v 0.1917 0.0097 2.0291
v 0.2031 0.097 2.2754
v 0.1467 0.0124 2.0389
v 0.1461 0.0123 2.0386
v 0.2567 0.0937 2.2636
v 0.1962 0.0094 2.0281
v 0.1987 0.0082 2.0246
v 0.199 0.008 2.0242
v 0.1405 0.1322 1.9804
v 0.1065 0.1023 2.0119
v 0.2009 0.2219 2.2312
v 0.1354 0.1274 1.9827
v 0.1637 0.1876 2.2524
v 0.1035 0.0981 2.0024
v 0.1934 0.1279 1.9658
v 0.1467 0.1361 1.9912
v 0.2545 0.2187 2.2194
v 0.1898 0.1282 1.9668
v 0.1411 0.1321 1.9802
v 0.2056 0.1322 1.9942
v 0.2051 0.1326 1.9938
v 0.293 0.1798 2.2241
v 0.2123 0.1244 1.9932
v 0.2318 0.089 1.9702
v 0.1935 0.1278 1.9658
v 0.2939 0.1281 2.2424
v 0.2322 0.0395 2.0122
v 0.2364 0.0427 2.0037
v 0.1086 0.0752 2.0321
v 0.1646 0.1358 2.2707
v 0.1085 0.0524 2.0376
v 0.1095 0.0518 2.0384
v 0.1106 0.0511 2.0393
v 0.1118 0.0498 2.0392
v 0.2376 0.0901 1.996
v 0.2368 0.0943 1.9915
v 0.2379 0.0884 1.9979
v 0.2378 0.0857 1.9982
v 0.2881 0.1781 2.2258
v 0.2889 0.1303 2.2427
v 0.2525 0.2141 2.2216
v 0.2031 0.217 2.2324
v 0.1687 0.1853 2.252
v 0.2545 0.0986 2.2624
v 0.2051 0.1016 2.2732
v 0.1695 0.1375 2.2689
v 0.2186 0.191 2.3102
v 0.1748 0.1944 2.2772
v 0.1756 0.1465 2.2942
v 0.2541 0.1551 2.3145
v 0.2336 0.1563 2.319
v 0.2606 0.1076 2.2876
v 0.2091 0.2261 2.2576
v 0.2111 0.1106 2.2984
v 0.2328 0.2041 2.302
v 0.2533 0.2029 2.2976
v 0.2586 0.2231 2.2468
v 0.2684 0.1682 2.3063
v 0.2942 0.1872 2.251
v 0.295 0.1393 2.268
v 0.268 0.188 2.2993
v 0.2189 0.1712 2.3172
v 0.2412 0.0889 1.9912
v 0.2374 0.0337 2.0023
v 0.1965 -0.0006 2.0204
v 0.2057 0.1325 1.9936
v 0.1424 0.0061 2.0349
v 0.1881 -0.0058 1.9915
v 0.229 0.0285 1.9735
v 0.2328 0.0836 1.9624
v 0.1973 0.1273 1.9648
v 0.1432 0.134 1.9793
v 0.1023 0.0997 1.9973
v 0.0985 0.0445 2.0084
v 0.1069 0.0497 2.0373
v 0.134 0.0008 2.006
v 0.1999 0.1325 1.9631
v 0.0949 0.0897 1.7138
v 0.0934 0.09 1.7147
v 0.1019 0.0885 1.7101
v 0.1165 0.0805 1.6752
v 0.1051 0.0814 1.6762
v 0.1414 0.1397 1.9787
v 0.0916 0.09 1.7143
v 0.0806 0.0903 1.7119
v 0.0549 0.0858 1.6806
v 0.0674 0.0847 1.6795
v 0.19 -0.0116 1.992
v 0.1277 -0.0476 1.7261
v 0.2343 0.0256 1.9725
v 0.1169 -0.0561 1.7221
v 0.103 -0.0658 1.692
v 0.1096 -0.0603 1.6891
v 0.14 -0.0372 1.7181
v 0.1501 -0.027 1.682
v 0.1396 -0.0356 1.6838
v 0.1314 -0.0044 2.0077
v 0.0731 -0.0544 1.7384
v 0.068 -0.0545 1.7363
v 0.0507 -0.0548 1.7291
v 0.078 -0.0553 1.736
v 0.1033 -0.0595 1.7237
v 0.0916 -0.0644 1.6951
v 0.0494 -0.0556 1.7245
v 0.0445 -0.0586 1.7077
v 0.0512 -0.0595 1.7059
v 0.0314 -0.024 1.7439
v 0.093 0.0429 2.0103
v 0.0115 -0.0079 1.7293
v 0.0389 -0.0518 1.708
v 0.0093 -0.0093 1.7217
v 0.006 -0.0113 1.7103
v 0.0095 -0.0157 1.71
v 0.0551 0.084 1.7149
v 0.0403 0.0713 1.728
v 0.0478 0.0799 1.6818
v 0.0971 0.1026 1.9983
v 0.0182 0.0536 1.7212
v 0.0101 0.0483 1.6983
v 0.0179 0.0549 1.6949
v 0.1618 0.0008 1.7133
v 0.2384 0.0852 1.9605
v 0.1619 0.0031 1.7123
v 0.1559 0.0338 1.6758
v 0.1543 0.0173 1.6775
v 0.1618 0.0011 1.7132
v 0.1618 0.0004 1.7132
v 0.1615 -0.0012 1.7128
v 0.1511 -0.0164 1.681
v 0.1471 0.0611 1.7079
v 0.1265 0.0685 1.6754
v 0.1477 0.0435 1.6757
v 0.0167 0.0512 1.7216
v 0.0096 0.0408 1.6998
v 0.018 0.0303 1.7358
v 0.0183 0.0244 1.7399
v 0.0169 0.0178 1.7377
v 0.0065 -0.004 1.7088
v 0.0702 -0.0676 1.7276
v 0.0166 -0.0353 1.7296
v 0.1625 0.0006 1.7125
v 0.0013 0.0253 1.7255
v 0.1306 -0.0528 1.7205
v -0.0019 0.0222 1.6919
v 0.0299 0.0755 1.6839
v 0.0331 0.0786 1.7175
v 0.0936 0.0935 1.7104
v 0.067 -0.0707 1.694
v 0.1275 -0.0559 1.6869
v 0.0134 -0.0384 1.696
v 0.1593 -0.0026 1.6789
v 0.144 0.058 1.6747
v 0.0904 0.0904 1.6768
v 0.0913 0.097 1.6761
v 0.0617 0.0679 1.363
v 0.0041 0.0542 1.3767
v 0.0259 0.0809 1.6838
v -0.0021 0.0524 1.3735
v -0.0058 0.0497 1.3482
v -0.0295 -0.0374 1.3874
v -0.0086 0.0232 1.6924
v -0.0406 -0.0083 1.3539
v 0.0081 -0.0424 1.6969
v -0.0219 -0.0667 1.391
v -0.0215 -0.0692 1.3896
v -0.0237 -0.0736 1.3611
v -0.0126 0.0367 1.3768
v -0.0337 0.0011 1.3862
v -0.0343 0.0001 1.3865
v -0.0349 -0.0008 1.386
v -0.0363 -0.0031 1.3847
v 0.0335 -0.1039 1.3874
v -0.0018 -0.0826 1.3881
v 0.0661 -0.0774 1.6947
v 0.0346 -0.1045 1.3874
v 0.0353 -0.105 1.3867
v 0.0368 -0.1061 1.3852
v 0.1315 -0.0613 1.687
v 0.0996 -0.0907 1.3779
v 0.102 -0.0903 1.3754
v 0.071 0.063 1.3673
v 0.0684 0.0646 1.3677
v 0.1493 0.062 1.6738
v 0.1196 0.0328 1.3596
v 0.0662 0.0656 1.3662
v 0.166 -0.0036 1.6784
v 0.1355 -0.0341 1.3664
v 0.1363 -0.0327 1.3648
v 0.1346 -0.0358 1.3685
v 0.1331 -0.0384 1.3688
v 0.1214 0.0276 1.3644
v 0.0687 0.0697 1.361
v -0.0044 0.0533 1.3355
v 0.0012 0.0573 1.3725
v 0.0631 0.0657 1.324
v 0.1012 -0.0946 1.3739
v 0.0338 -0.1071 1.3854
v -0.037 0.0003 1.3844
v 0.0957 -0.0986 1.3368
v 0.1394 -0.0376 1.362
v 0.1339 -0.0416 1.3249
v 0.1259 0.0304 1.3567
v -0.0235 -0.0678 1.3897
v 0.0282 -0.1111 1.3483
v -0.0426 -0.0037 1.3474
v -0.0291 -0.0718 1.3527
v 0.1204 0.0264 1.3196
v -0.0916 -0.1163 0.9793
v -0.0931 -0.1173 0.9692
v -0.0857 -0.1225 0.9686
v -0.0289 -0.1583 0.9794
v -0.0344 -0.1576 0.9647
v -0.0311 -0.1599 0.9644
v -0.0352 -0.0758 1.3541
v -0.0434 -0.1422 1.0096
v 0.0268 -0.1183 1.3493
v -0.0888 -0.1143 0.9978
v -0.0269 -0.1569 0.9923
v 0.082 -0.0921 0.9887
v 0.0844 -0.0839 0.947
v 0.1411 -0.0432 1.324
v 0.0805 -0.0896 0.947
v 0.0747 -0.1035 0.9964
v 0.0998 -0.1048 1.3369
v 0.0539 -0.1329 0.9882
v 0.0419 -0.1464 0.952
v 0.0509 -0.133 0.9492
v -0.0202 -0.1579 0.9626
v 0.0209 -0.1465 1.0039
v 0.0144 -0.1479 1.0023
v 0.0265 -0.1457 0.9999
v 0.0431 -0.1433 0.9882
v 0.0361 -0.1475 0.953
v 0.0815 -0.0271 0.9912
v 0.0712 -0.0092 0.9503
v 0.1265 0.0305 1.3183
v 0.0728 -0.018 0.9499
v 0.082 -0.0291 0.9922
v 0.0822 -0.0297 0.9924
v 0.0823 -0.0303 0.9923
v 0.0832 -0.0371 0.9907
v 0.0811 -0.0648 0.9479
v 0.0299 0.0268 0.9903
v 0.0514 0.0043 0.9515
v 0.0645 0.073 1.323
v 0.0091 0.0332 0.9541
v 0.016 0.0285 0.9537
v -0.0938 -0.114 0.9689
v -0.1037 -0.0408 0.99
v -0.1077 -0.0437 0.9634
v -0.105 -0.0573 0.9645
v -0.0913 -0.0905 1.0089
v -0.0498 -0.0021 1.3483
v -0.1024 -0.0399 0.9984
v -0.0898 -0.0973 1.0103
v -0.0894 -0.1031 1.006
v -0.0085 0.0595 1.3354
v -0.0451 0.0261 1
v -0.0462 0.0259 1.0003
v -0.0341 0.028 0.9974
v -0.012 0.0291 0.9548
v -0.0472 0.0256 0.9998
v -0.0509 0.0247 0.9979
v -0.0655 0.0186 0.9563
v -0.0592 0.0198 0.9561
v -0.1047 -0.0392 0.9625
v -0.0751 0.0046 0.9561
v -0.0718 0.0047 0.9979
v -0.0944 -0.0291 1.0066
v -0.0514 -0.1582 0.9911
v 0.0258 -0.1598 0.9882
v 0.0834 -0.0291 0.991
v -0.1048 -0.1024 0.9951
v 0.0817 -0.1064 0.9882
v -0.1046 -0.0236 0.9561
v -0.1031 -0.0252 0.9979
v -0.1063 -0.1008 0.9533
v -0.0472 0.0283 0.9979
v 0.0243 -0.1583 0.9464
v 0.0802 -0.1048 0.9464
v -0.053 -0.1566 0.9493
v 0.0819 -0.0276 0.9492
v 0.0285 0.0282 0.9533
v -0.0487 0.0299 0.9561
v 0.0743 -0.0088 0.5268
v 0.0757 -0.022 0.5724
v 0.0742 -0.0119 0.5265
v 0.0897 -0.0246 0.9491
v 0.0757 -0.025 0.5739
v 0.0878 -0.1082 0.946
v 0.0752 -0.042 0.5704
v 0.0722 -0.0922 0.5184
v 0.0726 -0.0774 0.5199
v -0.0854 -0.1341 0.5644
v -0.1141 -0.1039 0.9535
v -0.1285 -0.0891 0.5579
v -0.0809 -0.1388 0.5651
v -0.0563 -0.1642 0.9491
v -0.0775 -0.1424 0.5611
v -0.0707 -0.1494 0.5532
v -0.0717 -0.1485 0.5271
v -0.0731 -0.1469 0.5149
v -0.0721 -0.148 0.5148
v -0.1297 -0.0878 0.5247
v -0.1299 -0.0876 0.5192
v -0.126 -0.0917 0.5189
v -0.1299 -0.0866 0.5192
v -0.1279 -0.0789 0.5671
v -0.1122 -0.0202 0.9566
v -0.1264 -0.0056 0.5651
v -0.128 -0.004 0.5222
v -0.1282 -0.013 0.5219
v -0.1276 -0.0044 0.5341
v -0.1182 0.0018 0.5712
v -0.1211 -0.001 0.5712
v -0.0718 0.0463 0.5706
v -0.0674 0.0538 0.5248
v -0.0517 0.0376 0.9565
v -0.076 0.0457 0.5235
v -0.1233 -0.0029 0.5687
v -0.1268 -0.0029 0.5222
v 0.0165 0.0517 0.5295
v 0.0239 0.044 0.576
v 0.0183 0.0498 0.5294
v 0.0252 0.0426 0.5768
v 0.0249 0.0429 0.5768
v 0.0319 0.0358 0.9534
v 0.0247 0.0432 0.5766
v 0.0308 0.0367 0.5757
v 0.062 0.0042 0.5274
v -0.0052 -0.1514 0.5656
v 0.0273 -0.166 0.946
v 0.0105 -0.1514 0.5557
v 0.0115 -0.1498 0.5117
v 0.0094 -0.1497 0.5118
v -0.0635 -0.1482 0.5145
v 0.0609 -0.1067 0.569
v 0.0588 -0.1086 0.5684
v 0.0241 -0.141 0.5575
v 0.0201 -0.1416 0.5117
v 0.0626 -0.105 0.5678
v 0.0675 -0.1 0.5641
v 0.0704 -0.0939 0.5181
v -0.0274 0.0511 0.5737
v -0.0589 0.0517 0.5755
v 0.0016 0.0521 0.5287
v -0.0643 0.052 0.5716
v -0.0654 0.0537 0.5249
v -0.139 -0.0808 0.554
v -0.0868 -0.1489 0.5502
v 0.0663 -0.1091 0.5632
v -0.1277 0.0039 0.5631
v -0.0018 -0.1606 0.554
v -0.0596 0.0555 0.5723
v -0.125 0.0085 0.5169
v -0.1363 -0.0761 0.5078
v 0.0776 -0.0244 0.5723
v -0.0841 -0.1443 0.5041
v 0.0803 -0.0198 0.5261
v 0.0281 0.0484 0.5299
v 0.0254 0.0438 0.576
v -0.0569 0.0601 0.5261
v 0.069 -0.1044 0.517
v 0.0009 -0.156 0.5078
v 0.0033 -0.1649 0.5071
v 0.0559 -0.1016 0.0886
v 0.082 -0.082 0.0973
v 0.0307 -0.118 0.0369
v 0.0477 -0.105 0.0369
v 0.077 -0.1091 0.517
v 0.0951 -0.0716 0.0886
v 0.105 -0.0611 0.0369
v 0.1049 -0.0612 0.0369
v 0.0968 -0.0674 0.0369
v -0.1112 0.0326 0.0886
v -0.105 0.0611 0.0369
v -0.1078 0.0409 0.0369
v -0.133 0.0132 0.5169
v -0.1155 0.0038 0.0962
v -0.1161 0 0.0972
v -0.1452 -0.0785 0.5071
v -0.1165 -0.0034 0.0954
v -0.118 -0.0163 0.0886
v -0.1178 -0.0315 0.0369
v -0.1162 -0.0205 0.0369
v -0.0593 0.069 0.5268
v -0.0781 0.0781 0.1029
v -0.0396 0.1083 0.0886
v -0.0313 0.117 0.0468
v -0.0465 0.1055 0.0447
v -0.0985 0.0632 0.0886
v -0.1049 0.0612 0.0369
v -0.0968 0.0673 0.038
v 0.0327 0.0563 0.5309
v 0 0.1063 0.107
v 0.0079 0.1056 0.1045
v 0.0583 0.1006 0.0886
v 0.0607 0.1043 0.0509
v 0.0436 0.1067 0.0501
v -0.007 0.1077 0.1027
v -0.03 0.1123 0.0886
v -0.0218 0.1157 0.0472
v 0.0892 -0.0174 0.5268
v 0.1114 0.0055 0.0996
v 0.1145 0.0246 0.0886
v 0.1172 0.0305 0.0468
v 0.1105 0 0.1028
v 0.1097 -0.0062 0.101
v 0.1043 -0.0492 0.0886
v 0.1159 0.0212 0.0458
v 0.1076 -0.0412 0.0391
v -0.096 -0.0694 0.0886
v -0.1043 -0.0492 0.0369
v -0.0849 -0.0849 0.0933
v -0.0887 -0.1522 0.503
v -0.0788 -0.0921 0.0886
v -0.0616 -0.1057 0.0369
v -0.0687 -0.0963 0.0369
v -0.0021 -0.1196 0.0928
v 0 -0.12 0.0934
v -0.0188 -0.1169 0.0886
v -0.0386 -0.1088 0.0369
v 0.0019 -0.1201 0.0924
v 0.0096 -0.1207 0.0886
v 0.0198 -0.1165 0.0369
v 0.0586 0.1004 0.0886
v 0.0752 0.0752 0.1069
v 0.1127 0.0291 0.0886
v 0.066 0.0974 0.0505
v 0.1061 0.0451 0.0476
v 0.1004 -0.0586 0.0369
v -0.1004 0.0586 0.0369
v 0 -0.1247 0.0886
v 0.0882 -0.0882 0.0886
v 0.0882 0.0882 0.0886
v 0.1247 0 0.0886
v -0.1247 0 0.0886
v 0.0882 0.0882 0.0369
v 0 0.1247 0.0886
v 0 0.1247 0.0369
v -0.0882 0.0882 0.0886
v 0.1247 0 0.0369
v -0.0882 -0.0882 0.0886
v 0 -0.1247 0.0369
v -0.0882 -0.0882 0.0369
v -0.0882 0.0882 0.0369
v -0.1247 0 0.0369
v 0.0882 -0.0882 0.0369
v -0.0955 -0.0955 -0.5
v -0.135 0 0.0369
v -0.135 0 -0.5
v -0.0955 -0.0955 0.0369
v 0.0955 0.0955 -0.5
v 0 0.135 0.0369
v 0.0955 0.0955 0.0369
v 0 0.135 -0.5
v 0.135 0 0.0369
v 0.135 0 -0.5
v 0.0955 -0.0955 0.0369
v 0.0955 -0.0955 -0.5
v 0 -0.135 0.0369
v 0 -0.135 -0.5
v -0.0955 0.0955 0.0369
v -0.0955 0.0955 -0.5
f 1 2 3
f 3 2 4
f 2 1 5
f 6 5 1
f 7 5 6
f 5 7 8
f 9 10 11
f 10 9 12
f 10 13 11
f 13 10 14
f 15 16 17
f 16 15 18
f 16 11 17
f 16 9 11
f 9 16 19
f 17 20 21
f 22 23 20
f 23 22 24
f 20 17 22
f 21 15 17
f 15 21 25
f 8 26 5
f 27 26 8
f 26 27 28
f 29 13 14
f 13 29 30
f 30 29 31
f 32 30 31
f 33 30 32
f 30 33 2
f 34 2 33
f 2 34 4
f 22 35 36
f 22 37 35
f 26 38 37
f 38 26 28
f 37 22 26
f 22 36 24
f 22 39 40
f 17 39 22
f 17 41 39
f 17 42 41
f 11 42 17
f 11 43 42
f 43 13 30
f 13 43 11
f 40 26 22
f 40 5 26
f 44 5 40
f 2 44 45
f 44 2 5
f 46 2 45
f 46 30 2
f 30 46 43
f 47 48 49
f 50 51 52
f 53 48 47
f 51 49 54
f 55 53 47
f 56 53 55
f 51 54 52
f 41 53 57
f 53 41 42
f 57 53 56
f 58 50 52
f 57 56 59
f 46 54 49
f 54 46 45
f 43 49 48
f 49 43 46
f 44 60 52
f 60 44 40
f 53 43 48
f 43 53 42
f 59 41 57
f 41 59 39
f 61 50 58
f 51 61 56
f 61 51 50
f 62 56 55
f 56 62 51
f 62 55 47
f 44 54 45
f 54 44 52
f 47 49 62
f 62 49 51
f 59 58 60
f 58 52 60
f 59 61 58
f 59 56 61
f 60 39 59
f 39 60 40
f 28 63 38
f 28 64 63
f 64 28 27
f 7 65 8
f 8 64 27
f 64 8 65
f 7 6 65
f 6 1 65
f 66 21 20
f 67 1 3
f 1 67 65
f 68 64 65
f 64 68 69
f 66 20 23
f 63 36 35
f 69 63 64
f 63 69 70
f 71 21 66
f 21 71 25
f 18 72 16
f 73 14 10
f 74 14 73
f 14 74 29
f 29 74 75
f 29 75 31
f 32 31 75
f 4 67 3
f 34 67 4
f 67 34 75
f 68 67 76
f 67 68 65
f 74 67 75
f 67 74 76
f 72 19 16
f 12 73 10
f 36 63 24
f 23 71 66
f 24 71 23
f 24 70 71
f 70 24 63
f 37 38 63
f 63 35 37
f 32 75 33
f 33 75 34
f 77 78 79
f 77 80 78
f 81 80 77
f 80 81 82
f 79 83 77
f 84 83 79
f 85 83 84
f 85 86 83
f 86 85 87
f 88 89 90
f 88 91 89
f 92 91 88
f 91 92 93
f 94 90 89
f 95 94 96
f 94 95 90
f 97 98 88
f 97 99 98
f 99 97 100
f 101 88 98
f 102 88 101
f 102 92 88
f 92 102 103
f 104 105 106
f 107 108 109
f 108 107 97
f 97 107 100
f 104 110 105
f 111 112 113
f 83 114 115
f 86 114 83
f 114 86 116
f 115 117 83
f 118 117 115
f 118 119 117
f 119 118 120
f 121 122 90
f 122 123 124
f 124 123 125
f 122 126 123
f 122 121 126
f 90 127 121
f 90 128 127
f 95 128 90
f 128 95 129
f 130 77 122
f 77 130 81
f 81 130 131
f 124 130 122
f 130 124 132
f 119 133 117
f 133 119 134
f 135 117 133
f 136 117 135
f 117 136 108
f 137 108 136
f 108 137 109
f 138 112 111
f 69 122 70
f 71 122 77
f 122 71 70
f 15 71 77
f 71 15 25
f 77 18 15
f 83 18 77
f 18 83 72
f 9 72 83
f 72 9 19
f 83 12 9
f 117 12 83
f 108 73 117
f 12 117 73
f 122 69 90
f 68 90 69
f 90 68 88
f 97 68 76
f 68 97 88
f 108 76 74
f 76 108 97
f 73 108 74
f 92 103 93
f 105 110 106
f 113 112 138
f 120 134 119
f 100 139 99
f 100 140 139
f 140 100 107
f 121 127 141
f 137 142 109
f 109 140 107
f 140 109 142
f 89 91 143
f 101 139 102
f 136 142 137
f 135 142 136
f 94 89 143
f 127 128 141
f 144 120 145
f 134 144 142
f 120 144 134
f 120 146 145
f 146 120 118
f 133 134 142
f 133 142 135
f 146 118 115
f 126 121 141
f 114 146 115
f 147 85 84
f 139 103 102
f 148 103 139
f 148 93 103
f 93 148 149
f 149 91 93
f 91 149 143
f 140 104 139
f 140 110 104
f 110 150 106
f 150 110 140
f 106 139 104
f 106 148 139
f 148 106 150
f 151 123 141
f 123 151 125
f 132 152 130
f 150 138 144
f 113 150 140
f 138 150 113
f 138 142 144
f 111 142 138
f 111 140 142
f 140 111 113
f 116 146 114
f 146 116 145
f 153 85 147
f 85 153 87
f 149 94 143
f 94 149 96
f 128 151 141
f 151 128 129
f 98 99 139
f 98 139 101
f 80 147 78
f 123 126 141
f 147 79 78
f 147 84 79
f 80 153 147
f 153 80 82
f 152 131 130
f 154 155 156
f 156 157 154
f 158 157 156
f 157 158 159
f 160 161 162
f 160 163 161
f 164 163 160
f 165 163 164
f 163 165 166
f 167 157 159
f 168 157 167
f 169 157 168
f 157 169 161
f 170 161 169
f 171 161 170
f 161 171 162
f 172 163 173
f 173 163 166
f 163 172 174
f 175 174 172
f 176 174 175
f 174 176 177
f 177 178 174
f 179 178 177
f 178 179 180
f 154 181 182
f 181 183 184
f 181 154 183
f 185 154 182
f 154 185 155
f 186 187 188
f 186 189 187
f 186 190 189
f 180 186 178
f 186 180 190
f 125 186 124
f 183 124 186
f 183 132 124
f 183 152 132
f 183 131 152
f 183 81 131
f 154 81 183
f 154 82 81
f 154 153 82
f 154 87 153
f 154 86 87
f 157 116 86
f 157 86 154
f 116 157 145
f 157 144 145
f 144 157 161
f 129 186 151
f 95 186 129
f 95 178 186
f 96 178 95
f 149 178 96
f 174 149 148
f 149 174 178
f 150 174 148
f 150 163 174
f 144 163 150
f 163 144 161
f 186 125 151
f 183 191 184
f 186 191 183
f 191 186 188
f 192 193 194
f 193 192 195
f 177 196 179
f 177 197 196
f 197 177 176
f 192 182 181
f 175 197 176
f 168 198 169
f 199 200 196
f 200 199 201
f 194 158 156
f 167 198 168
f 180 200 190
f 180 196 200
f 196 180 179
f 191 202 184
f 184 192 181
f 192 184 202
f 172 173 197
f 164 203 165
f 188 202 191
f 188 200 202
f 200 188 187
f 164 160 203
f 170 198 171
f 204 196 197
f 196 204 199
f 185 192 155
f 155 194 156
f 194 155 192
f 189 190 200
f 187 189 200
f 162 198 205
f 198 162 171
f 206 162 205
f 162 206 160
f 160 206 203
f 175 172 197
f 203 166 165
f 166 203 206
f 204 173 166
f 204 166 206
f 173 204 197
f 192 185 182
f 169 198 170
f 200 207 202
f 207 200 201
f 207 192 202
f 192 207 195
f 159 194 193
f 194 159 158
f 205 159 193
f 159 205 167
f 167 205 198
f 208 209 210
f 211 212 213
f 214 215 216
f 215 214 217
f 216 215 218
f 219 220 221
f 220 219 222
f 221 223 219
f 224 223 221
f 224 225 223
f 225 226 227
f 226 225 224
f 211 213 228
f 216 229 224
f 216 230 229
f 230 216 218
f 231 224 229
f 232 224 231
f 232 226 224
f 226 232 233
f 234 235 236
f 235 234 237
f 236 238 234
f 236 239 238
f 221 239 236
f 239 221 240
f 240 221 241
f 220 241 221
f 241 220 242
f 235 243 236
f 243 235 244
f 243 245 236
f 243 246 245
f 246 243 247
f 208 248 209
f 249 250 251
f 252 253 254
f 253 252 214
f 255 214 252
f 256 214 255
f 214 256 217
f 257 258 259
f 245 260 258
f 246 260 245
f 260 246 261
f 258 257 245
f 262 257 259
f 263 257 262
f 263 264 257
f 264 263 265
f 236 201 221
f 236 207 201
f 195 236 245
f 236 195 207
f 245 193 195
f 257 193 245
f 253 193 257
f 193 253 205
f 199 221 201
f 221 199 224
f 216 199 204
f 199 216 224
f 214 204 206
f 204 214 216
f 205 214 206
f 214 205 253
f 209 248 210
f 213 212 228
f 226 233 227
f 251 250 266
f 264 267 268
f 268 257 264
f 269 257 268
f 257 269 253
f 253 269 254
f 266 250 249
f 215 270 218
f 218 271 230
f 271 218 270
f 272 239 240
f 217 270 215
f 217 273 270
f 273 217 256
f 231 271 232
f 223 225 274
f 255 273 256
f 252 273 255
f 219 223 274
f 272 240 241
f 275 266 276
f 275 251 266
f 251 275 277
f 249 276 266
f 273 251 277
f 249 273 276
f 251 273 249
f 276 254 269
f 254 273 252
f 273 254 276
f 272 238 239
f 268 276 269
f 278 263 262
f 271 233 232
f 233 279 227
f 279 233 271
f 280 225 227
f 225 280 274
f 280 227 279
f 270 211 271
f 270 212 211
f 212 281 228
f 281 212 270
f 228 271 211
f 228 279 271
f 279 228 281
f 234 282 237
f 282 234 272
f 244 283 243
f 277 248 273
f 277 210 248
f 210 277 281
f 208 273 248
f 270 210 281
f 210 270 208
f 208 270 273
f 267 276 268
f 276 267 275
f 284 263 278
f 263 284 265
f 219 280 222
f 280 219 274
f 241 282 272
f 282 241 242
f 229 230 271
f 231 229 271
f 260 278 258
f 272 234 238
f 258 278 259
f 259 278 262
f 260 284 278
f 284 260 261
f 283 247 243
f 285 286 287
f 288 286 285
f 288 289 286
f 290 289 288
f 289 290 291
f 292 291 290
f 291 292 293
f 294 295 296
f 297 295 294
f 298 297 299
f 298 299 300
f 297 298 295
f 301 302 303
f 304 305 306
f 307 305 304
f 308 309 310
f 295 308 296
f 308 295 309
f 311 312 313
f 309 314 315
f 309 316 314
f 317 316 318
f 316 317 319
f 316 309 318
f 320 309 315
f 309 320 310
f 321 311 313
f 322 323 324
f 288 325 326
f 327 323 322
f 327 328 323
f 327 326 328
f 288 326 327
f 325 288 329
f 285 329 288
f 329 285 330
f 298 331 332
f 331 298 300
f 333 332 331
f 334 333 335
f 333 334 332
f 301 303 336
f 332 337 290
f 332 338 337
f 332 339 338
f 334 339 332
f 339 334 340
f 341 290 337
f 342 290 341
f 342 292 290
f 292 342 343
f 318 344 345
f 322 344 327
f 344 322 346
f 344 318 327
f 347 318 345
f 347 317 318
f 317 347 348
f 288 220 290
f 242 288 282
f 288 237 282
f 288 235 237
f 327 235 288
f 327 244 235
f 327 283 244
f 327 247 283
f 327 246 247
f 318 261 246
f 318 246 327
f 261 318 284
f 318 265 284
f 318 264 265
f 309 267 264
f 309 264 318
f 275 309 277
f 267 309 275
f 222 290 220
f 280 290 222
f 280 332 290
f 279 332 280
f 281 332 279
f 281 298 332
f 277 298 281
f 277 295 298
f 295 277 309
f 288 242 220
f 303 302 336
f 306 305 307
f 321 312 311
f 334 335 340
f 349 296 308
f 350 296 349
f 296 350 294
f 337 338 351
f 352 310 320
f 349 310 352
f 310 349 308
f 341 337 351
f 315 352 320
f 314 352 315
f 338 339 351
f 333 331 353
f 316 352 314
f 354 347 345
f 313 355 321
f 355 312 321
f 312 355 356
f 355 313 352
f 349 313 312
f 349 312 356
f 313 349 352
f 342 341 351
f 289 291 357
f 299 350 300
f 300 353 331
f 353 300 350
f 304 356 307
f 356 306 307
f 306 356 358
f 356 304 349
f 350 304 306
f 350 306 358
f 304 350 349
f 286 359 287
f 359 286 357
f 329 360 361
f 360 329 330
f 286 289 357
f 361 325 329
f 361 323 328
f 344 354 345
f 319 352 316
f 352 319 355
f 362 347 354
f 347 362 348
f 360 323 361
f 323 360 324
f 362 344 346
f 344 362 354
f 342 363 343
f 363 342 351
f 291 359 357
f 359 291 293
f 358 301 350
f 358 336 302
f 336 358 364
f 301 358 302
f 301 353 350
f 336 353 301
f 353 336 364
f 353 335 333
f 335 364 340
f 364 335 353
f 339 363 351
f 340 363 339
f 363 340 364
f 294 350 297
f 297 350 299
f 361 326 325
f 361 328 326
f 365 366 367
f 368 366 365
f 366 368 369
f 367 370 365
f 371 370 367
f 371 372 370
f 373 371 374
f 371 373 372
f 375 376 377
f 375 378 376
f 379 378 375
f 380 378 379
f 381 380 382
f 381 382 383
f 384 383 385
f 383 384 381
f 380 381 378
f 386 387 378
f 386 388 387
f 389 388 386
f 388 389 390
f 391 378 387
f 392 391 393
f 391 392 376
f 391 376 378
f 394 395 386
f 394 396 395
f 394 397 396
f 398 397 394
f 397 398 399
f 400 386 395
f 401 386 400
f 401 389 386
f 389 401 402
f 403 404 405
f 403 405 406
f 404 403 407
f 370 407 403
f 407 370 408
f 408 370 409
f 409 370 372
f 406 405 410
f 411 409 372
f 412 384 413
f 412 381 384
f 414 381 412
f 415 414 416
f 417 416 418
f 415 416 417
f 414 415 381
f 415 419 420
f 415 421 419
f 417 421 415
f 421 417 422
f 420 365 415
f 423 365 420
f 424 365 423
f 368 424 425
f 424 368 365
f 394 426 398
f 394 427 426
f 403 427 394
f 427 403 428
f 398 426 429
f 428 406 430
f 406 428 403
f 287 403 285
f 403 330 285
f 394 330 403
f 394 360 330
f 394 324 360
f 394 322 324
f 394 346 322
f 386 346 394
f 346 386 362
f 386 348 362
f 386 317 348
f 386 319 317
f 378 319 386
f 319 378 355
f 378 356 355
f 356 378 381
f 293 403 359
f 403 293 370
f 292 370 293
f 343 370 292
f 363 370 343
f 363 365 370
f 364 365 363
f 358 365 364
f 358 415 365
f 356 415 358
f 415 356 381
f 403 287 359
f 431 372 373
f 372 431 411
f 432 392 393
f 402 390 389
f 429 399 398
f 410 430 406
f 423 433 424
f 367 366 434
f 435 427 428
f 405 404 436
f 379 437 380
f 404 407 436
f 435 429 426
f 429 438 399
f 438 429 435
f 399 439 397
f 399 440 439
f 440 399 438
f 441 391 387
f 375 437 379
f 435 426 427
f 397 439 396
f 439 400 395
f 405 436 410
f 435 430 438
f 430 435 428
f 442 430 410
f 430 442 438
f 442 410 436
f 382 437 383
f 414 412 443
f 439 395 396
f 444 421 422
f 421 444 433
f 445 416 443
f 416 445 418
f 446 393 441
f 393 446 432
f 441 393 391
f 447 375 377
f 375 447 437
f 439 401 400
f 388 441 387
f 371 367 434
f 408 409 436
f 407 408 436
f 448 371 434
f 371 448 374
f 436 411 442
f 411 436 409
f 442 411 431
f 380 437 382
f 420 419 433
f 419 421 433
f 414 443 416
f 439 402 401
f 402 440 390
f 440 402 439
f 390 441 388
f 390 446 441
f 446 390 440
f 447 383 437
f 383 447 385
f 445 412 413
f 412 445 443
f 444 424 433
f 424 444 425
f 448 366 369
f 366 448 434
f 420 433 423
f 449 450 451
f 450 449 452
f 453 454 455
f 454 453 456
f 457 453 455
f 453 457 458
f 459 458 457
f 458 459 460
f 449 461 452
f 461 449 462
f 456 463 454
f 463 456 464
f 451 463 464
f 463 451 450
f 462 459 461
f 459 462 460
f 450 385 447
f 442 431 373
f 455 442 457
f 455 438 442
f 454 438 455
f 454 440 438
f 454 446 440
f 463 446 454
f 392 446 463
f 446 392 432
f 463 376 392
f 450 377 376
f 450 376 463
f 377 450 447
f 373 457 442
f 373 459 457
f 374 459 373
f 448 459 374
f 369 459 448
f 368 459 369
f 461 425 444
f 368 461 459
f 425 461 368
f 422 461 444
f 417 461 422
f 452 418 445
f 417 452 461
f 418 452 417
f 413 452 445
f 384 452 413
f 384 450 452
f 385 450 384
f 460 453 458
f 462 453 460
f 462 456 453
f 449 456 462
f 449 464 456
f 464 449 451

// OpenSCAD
// Customizable Cactii
//
// By steveweber314
//
// 6/20/2016
//

// BEGIN CUSTOMIZER

/* [Cactii Parameters] */

random_seed = rands(0,1000,1)[0];

//width of segment
segment_width = 15;

//segment length relative to width
length_multiplier = rands(3,6,1)[0];

//number of iterations
number_of_iterations = rands(5,8,1)[0];

level_of_smoothness = 8;


module trunk(width, depth, seed)
{
    //create an array of random numbers
    operation = rands(1,100,1, seed+5);

        echo(operation);

        //choose a module based on that array
        if (operation[0] < 60)
        {
            straight_trunk(width*.9, depth, seed+23546);
        }
        else if (operation[0] < 70)
        {
            branch_crook(width*.9, depth, seed+28543);
        }
        else if (operation[0] < 98)
        {
            branch_left(width*.9, depth, seed+28543);
        }
        else
        {
           sphere(width);
        }

}

module straight_trunk(width, depth, seed)
{
	rotations = rands(-10,10,10, seed+987654);

	color([0,1,0])
	{

		cylinder(h = width*length_multiplier, r1 = width, r2 = width);


        //move to the tip of the branch
        translate([0,0,width*length_multiplier])
        {

            union()
            {

                sphere(width);
                rotate([0+rotations[0],0+rotations[1],0+36*rotations[2]])
                {
                    //check for stop condition
                    if (depth > 0)
                    {
                        //build another trunk
                        trunk(width, depth-1, seed+8532);
                    }
                }
            }

        }
    }
}

module branch_left(width, depth, seed)
{
    rotations = rands(-10,10,10, seed+45678);


	color([0,1,0])
	{
		//create the branch by tapering a cylinder from one radius to another
		cylinder(h = width*length_multiplier, r1 = width, r2 = width);


        //move to the tip of the branch
        translate([0,0,width*length_multiplier])
        {

            union()
            {

                sphere(width);

                //trunk
                rotate([0+rotations[0],0+rotations[1],0+36*rotations[2]])
                {
                    //check for stop condition
                    if (depth > 0)
                    {
                        //build another trunk
                        trunk(width, depth-1, seed+24571);
                    }
                }
                //branch
                rotate([0+rotations[0],0+rotations[1],0+36*rotations[2]])
                {
                    //check for stop condition
                    if (depth > 0)
                    {
                        rotate([0,90,36*rotations[3]])
                        {
                            cylinder(h = width*length_multiplier*0.75, r1 = width, r2 = width);
                            translate([0,0,width*length_multiplier*0.75])
                            {
                                            sphere(width);
                                rotate([0,-90,0])
                                {
                                    //build another trunk
                                    trunk(width*.75, depth-1, seed+1);
                                }
                            }
                        }
                    }
                }
            }
        }
	}
}


module branch_crook(width, depth, seed)
{
    rotations = rands(-10,10,10, seed+75326);


	color([0,1,0])
	{
		//create the branch by tapering a cylinder from one radius to another
		cylinder(h = width*length_multiplier, r1 = width, r2 = width);


        //move to the tip of the branch
        translate([0,0,width*length_multiplier])
        {

            union()
            {

                sphere(width);

                //branch
                rotate([0+rotations[0],0+rotations[1],0+36*rotations[2]])
                {
                    //check for stop condition
                    if (depth > 0)
                    {
                        rotate([0,-90,36*rotations[3]])
                        {
                            cylinder(h = width*length_multiplier*0.75, r1 = width, r2 = width);
                            translate([0,0,width*length_multiplier*0.75])
                            {
                                sphere(width);
                                rotate([0,90,0])
                                {
                                    //build another trunk
                                    trunk(width*.75, depth-1, seed+1);
                                }
                            }
                        }
                    }
                }
            }
        }
	}
}


translate([0,0,-0.5]) scale([0.01,0.01,0.01]) union()
{

    //build the tree
    trunk(segment_width, number_of_iterations, $fn=level_of_smoothness, random_seed);
}
